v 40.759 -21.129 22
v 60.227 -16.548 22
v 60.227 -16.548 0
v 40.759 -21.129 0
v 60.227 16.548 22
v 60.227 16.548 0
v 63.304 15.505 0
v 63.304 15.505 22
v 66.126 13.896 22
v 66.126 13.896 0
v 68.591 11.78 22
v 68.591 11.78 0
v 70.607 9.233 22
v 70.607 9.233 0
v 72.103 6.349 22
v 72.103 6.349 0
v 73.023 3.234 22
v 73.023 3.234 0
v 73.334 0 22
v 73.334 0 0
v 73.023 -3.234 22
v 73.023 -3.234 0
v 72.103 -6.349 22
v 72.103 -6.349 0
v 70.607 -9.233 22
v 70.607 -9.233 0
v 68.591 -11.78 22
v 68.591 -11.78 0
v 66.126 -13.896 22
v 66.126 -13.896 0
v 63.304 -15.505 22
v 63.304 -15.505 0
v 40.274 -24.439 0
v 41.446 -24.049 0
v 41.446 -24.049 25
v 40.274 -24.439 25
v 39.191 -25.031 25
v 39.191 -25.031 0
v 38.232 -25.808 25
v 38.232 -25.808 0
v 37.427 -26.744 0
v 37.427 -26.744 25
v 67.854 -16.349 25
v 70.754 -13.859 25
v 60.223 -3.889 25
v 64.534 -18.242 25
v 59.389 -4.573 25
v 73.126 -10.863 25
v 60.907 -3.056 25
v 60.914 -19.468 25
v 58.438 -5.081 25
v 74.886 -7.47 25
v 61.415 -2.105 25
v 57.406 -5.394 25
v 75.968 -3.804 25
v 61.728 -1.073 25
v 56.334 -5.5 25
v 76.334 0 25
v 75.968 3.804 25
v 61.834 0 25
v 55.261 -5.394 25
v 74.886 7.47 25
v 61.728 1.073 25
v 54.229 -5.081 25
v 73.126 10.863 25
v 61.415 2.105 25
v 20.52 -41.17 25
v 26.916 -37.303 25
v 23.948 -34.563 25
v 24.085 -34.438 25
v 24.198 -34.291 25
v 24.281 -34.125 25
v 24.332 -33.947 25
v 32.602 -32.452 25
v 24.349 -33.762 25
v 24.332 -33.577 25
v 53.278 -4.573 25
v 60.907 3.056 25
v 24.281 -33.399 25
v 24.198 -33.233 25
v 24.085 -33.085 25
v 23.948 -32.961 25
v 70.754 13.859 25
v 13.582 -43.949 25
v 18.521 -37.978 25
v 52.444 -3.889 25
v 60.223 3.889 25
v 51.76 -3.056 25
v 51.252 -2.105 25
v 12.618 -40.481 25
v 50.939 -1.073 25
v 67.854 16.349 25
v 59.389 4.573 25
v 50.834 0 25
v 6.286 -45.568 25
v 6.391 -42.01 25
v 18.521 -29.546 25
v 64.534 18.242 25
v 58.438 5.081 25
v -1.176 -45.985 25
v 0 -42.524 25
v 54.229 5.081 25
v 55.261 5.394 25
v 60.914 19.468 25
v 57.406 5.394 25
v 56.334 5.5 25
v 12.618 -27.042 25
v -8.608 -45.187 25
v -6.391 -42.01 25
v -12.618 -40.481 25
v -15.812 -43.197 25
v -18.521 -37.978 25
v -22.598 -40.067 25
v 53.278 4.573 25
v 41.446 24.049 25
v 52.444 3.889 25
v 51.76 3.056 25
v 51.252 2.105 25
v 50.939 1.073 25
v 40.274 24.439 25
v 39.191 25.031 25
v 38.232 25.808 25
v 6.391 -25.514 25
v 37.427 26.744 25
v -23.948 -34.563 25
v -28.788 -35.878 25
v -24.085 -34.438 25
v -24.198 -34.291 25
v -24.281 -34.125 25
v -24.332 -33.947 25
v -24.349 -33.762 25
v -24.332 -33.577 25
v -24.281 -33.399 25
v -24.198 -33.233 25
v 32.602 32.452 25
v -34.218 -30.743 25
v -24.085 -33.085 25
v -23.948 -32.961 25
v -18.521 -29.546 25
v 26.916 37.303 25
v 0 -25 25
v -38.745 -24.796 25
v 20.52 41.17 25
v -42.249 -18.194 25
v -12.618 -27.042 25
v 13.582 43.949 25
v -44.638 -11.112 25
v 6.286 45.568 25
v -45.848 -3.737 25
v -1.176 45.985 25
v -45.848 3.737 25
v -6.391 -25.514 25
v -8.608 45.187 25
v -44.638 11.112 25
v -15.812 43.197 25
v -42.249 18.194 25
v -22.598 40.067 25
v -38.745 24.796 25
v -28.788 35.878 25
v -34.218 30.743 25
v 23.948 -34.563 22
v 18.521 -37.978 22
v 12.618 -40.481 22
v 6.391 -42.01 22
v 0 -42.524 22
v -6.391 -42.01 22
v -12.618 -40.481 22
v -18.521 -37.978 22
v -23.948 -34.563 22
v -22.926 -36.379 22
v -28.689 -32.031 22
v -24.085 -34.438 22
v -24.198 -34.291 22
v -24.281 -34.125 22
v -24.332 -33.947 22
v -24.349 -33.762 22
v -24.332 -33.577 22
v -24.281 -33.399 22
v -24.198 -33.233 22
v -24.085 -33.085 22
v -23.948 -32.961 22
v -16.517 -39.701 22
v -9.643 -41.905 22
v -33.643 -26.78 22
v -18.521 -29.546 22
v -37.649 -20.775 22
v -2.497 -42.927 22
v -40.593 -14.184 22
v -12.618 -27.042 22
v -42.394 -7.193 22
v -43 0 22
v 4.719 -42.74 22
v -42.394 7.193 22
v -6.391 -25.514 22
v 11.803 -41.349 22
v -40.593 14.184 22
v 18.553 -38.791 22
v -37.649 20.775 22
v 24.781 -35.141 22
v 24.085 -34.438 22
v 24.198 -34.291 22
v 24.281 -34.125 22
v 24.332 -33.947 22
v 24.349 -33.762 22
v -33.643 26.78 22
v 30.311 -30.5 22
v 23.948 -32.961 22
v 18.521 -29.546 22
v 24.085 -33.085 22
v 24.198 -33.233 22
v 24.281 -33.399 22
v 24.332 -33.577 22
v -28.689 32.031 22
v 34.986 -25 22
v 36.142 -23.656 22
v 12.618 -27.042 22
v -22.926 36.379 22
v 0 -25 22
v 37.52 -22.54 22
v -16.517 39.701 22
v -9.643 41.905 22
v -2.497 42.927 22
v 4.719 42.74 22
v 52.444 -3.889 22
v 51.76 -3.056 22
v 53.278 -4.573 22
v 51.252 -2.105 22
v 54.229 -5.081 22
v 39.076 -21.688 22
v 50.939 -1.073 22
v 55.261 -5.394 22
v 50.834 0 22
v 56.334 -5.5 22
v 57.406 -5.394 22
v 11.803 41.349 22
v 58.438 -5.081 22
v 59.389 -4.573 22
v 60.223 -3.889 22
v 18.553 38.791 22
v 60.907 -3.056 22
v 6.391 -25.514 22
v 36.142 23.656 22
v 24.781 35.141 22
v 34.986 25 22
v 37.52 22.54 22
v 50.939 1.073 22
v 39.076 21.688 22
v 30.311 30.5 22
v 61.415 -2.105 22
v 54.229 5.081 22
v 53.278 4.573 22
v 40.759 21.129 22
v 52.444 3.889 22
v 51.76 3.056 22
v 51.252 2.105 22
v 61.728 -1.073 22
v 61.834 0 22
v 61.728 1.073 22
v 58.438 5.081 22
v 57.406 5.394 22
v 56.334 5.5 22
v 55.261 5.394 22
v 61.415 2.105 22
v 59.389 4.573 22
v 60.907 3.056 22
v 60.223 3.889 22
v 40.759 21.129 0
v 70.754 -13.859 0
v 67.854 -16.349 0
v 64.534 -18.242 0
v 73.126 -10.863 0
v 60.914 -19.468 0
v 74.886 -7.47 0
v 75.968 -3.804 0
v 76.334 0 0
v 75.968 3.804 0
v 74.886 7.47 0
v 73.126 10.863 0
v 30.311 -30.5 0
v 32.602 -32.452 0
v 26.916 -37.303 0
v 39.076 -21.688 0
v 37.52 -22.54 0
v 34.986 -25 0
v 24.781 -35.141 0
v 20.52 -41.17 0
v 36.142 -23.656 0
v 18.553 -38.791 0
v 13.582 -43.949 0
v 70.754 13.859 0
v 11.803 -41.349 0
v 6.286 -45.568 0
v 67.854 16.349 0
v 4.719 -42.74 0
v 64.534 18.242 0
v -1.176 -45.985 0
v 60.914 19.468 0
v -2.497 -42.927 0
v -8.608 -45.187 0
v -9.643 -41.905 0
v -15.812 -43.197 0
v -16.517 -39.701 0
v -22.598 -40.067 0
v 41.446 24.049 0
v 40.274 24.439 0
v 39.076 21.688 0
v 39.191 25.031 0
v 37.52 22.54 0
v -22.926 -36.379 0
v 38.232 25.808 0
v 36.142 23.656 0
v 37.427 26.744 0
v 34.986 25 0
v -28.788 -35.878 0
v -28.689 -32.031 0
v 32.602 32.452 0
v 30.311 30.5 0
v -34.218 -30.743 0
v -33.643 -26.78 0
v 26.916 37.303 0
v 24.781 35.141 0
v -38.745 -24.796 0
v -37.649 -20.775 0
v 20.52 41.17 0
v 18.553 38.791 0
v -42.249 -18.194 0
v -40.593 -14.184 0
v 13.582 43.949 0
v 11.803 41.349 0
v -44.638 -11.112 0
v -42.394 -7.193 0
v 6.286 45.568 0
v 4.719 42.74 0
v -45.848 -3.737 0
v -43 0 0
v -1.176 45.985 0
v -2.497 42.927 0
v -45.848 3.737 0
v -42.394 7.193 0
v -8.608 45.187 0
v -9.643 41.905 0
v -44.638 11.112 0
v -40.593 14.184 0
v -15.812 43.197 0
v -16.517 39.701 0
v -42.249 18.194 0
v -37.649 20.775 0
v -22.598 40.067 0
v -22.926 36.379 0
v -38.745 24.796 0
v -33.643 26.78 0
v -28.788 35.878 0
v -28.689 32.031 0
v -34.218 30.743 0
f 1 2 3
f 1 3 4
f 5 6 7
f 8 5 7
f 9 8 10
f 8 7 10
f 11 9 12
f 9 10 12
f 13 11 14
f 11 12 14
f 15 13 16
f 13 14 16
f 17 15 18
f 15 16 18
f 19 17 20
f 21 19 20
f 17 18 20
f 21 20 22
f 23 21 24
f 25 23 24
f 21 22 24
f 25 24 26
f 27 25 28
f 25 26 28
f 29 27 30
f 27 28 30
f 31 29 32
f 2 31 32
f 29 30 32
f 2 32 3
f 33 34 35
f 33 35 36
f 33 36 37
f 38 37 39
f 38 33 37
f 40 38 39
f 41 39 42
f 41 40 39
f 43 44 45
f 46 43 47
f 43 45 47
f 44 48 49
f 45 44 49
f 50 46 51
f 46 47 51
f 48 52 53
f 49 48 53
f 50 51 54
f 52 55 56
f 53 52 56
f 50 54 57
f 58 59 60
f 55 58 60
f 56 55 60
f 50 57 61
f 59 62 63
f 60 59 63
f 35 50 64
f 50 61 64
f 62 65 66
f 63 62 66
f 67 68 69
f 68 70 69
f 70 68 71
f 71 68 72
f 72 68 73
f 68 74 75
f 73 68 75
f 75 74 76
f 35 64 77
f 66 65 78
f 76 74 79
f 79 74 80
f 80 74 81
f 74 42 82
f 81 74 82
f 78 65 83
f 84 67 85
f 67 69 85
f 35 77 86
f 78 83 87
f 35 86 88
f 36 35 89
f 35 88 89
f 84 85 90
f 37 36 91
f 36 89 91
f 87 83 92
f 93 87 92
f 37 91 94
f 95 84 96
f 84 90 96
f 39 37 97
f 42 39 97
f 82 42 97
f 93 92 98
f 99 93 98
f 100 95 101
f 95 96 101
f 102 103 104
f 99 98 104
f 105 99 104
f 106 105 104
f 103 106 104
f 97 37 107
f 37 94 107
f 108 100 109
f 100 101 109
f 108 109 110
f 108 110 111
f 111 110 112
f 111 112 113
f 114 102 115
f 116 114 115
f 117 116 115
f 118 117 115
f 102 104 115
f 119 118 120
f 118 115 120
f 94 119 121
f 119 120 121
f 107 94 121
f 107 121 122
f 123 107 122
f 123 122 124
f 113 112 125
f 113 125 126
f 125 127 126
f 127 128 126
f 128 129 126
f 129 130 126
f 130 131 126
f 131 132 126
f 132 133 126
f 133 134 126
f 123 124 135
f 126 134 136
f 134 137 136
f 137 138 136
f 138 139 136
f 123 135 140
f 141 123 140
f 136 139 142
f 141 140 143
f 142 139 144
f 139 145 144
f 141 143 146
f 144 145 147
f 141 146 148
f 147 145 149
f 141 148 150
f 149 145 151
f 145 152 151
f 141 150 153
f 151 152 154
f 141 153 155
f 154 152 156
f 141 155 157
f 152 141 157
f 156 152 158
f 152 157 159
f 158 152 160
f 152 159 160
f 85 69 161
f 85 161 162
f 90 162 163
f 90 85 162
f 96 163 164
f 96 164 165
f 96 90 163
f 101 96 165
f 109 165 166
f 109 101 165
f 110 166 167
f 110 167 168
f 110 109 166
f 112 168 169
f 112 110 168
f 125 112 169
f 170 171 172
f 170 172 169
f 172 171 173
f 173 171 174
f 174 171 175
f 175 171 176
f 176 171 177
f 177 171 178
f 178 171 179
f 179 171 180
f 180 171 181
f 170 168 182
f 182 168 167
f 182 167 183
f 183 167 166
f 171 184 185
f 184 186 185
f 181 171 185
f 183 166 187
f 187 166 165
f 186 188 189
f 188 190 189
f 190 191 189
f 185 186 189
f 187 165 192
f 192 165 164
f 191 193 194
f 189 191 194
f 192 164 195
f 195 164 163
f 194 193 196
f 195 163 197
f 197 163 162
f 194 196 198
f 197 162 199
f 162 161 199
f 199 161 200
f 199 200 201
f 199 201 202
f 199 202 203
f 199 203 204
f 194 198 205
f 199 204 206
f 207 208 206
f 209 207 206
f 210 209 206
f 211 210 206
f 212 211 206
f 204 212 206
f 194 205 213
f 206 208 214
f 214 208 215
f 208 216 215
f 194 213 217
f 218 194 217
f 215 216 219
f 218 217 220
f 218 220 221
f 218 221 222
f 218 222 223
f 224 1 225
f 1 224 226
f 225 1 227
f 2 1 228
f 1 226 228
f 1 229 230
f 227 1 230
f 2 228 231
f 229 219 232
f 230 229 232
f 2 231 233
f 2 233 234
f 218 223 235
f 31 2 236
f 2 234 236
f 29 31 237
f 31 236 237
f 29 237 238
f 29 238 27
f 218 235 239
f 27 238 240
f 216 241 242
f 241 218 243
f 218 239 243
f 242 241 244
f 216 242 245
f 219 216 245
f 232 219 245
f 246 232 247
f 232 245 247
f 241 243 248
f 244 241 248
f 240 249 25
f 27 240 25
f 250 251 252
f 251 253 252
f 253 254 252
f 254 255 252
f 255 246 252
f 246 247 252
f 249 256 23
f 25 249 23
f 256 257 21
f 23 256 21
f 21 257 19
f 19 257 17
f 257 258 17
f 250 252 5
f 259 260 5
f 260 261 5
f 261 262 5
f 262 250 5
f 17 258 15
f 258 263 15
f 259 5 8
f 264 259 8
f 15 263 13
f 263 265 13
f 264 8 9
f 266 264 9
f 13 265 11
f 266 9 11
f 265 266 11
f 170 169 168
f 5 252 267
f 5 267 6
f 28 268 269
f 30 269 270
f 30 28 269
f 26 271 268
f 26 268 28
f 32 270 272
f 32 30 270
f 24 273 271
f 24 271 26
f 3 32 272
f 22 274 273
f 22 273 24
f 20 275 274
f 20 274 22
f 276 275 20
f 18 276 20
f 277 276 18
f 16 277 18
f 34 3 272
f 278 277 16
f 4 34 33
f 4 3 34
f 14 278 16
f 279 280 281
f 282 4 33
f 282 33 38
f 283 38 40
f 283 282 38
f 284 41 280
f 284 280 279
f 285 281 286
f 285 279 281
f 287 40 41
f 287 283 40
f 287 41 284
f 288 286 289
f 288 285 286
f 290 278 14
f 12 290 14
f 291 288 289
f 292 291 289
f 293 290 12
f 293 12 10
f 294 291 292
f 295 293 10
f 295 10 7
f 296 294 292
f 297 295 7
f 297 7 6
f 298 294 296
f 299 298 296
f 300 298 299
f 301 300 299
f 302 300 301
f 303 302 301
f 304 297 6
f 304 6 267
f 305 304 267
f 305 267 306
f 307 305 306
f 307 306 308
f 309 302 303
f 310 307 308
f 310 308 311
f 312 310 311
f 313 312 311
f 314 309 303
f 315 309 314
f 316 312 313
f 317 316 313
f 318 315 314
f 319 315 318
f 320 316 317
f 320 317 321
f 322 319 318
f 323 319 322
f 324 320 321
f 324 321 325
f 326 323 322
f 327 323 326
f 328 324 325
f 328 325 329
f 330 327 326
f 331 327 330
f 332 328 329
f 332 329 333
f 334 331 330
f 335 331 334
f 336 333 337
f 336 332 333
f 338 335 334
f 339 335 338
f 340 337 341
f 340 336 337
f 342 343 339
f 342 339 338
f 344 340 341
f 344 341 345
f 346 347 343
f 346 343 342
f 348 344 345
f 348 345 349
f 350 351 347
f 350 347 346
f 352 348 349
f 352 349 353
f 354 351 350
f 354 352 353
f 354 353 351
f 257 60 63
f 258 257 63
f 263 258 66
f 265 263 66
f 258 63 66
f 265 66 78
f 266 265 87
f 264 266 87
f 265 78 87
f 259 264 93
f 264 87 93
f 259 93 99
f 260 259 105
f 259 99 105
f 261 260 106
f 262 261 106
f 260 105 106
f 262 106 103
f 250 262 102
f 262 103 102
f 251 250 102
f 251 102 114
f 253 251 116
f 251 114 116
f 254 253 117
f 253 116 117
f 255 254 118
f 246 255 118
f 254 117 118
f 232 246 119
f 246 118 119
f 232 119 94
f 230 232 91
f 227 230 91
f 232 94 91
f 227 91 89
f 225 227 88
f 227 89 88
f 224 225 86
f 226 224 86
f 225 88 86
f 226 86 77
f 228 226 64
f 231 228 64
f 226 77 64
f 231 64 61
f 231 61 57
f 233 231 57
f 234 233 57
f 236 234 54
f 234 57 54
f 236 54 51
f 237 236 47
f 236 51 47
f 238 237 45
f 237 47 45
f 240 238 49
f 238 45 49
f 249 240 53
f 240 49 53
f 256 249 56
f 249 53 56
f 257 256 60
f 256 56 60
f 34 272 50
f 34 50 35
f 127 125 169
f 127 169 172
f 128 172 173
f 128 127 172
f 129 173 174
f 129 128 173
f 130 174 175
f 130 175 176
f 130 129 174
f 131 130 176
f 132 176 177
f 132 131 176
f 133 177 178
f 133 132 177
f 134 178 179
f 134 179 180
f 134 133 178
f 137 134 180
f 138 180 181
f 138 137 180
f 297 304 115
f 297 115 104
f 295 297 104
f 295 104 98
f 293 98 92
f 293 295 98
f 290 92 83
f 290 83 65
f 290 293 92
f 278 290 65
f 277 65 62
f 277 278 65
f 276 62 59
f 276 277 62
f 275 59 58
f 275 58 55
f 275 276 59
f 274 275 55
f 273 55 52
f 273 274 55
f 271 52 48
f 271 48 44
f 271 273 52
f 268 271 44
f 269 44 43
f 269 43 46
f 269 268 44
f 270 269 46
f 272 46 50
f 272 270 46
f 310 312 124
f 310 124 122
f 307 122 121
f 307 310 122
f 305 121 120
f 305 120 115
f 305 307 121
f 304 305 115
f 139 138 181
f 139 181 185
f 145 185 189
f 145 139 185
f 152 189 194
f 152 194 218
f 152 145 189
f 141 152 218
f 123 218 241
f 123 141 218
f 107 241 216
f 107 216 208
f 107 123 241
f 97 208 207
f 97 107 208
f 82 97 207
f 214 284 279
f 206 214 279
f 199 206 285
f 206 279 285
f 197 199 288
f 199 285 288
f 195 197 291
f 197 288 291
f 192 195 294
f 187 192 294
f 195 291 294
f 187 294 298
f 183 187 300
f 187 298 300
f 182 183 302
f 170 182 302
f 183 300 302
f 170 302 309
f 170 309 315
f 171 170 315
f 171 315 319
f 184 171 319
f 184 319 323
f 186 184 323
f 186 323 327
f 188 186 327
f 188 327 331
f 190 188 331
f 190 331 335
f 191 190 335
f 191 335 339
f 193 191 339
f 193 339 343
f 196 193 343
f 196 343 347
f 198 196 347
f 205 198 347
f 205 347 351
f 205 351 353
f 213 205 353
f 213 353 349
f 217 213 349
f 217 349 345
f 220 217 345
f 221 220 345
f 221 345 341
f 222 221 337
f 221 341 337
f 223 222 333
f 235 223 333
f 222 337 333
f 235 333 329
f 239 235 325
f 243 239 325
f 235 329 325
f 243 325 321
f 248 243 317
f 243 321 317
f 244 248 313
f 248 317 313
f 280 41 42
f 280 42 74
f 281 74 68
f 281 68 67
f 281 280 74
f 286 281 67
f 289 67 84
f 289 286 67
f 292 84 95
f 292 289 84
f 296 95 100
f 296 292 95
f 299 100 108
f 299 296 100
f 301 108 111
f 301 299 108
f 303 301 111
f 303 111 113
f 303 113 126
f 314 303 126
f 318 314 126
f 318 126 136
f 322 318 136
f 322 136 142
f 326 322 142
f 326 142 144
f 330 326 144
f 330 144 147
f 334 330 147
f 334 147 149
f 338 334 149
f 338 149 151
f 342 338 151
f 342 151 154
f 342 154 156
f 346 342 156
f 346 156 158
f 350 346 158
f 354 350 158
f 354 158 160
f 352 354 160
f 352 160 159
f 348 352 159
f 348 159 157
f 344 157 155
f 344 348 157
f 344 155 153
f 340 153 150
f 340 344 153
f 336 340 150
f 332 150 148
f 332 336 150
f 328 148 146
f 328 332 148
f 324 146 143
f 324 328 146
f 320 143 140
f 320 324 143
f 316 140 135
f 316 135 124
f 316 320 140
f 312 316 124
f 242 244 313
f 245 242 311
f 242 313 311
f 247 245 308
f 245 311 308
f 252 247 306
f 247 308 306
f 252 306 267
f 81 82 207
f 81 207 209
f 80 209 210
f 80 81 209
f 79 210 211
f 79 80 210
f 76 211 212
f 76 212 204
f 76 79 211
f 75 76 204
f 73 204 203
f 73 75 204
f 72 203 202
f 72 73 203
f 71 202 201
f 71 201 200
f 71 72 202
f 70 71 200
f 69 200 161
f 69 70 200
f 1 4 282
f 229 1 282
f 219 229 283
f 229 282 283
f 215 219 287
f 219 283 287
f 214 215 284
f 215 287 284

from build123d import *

# Parameters (mm, degrees)
SALIENTE_EXTRUIR1_DEPTH = 25
SALIENTE_EXTRUIR2_START = -3
SALIENTE_EXTRUIR2_DEPTH = 3
CORTAR_EXTRUIR1_DEPTH   = 3
CROQUIS4_R              = 5.5
CORTAR_EXTRUIR2_DEPTH   = 3


with BuildPart() as part:
    # Croquis1 → Saliente-Extruir1 (new body)
    with BuildSketch(Plane.XY):
        with BuildLine():
            Line((41.445702238, 24.048980806), (60.914091522, 19.468389284))
            ThreePointArc((60.914091522, 19.468389284), (76.3335, 0), (60.914091522, -19.468389284))
            Line((60.914091522, -19.468389284), (41.445702238, -24.048980806))
            ThreePointArc((41.445702238, -24.048980806), (39.191168738, -25.031281724), (37.426574478, -26.744186711))
            ThreePointArc((37.426574478, -26.744186711), (-46, 2.97e-07), (37.426574823, 26.744186228))
            ThreePointArc((37.426574823, 26.744186228), (39.191168984, 25.031281559), (41.445702238, 24.048980806))
        make_face()
        with BuildLine():
            Line((40.758613509, 21.128722413), (60.227002793, 16.548130891))
            ThreePointArc((60.227002793, 16.548130891), (73.3335, 0), (60.227002793, -16.548130891))
            Line((60.227002793, -16.548130891), (40.758613509, -21.128722413))
            ThreePointArc((40.758613509, -21.128722413), (37.520298481, -22.539657237), (34.985711121, -25.000000347))
            ThreePointArc((34.985711121, -25.000000347), (-43, 4.27e-07), (34.985711617, 24.999999653))
            ThreePointArc((34.985711617, 24.999999653), (37.520298835, 22.539656999), (40.758613509, 21.128722413))
        make_face(mode=Mode.SUBTRACT)
    extrude(amount=SALIENTE_EXTRUIR1_DEPTH)

    # Croquis2 → Saliente-Extruir2 (add)
    with BuildSketch(Plane.XY.offset(25).offset(SALIENTE_EXTRUIR2_START)):
        with BuildLine():
            Line((41.445702238, -24.048980806), (60.914091522, -19.468389284))
            ThreePointArc((60.914091522, -19.468389284), (76.3335, 0), (60.914091522, 19.468389284))
            Line((60.914091522, 19.468389284), (41.445702238, 24.048980806))
            ThreePointArc((41.445702238, 24.048980806), (39.191168984, 25.031281559), (37.426574823, 26.744186228))
            ThreePointArc((37.426574823, 26.744186228), (-46, 2.97e-07), (37.426574478, -26.744186711))
            ThreePointArc((37.426574478, -26.744186711), (39.191168738, -25.031281724), (41.445702238, -24.048980806))
        make_face()
    extrude(amount=SALIENTE_EXTRUIR2_DEPTH)

    # Croquis3 → Cortar-Extruir1 (cut)
    with BuildSketch(Plane.XY.offset(25)):
        with BuildLine():
            ThreePointArc((-23.947692308, -34.562794151), (-24.349, -33.76181505), (-23.947692308, -32.960835948))
            ThreePointArc((-23.947692308, -32.960835948), (0, -25), (23.947692308, -32.960835948))
            ThreePointArc((23.947692308, -32.960835948), (24.349, -33.76181505), (23.947692308, -34.562794151))
            ThreePointArc((23.947692308, -34.562794151), (0, -42.523630099), (-23.947692308, -34.562794151))
        make_face()
    extrude(amount=-CORTAR_EXTRUIR1_DEPTH, mode=Mode.SUBTRACT)

    # Croquis4 → Cortar-Extruir2 (cut)
    with BuildSketch(Plane.XY.offset(25)):
        with Locations((56.3335, 0)):
            Circle(CROQUIS4_R)
    extrude(amount=-CORTAR_EXTRUIR2_DEPTH, mode=Mode.SUBTRACT)


solid = part.part
